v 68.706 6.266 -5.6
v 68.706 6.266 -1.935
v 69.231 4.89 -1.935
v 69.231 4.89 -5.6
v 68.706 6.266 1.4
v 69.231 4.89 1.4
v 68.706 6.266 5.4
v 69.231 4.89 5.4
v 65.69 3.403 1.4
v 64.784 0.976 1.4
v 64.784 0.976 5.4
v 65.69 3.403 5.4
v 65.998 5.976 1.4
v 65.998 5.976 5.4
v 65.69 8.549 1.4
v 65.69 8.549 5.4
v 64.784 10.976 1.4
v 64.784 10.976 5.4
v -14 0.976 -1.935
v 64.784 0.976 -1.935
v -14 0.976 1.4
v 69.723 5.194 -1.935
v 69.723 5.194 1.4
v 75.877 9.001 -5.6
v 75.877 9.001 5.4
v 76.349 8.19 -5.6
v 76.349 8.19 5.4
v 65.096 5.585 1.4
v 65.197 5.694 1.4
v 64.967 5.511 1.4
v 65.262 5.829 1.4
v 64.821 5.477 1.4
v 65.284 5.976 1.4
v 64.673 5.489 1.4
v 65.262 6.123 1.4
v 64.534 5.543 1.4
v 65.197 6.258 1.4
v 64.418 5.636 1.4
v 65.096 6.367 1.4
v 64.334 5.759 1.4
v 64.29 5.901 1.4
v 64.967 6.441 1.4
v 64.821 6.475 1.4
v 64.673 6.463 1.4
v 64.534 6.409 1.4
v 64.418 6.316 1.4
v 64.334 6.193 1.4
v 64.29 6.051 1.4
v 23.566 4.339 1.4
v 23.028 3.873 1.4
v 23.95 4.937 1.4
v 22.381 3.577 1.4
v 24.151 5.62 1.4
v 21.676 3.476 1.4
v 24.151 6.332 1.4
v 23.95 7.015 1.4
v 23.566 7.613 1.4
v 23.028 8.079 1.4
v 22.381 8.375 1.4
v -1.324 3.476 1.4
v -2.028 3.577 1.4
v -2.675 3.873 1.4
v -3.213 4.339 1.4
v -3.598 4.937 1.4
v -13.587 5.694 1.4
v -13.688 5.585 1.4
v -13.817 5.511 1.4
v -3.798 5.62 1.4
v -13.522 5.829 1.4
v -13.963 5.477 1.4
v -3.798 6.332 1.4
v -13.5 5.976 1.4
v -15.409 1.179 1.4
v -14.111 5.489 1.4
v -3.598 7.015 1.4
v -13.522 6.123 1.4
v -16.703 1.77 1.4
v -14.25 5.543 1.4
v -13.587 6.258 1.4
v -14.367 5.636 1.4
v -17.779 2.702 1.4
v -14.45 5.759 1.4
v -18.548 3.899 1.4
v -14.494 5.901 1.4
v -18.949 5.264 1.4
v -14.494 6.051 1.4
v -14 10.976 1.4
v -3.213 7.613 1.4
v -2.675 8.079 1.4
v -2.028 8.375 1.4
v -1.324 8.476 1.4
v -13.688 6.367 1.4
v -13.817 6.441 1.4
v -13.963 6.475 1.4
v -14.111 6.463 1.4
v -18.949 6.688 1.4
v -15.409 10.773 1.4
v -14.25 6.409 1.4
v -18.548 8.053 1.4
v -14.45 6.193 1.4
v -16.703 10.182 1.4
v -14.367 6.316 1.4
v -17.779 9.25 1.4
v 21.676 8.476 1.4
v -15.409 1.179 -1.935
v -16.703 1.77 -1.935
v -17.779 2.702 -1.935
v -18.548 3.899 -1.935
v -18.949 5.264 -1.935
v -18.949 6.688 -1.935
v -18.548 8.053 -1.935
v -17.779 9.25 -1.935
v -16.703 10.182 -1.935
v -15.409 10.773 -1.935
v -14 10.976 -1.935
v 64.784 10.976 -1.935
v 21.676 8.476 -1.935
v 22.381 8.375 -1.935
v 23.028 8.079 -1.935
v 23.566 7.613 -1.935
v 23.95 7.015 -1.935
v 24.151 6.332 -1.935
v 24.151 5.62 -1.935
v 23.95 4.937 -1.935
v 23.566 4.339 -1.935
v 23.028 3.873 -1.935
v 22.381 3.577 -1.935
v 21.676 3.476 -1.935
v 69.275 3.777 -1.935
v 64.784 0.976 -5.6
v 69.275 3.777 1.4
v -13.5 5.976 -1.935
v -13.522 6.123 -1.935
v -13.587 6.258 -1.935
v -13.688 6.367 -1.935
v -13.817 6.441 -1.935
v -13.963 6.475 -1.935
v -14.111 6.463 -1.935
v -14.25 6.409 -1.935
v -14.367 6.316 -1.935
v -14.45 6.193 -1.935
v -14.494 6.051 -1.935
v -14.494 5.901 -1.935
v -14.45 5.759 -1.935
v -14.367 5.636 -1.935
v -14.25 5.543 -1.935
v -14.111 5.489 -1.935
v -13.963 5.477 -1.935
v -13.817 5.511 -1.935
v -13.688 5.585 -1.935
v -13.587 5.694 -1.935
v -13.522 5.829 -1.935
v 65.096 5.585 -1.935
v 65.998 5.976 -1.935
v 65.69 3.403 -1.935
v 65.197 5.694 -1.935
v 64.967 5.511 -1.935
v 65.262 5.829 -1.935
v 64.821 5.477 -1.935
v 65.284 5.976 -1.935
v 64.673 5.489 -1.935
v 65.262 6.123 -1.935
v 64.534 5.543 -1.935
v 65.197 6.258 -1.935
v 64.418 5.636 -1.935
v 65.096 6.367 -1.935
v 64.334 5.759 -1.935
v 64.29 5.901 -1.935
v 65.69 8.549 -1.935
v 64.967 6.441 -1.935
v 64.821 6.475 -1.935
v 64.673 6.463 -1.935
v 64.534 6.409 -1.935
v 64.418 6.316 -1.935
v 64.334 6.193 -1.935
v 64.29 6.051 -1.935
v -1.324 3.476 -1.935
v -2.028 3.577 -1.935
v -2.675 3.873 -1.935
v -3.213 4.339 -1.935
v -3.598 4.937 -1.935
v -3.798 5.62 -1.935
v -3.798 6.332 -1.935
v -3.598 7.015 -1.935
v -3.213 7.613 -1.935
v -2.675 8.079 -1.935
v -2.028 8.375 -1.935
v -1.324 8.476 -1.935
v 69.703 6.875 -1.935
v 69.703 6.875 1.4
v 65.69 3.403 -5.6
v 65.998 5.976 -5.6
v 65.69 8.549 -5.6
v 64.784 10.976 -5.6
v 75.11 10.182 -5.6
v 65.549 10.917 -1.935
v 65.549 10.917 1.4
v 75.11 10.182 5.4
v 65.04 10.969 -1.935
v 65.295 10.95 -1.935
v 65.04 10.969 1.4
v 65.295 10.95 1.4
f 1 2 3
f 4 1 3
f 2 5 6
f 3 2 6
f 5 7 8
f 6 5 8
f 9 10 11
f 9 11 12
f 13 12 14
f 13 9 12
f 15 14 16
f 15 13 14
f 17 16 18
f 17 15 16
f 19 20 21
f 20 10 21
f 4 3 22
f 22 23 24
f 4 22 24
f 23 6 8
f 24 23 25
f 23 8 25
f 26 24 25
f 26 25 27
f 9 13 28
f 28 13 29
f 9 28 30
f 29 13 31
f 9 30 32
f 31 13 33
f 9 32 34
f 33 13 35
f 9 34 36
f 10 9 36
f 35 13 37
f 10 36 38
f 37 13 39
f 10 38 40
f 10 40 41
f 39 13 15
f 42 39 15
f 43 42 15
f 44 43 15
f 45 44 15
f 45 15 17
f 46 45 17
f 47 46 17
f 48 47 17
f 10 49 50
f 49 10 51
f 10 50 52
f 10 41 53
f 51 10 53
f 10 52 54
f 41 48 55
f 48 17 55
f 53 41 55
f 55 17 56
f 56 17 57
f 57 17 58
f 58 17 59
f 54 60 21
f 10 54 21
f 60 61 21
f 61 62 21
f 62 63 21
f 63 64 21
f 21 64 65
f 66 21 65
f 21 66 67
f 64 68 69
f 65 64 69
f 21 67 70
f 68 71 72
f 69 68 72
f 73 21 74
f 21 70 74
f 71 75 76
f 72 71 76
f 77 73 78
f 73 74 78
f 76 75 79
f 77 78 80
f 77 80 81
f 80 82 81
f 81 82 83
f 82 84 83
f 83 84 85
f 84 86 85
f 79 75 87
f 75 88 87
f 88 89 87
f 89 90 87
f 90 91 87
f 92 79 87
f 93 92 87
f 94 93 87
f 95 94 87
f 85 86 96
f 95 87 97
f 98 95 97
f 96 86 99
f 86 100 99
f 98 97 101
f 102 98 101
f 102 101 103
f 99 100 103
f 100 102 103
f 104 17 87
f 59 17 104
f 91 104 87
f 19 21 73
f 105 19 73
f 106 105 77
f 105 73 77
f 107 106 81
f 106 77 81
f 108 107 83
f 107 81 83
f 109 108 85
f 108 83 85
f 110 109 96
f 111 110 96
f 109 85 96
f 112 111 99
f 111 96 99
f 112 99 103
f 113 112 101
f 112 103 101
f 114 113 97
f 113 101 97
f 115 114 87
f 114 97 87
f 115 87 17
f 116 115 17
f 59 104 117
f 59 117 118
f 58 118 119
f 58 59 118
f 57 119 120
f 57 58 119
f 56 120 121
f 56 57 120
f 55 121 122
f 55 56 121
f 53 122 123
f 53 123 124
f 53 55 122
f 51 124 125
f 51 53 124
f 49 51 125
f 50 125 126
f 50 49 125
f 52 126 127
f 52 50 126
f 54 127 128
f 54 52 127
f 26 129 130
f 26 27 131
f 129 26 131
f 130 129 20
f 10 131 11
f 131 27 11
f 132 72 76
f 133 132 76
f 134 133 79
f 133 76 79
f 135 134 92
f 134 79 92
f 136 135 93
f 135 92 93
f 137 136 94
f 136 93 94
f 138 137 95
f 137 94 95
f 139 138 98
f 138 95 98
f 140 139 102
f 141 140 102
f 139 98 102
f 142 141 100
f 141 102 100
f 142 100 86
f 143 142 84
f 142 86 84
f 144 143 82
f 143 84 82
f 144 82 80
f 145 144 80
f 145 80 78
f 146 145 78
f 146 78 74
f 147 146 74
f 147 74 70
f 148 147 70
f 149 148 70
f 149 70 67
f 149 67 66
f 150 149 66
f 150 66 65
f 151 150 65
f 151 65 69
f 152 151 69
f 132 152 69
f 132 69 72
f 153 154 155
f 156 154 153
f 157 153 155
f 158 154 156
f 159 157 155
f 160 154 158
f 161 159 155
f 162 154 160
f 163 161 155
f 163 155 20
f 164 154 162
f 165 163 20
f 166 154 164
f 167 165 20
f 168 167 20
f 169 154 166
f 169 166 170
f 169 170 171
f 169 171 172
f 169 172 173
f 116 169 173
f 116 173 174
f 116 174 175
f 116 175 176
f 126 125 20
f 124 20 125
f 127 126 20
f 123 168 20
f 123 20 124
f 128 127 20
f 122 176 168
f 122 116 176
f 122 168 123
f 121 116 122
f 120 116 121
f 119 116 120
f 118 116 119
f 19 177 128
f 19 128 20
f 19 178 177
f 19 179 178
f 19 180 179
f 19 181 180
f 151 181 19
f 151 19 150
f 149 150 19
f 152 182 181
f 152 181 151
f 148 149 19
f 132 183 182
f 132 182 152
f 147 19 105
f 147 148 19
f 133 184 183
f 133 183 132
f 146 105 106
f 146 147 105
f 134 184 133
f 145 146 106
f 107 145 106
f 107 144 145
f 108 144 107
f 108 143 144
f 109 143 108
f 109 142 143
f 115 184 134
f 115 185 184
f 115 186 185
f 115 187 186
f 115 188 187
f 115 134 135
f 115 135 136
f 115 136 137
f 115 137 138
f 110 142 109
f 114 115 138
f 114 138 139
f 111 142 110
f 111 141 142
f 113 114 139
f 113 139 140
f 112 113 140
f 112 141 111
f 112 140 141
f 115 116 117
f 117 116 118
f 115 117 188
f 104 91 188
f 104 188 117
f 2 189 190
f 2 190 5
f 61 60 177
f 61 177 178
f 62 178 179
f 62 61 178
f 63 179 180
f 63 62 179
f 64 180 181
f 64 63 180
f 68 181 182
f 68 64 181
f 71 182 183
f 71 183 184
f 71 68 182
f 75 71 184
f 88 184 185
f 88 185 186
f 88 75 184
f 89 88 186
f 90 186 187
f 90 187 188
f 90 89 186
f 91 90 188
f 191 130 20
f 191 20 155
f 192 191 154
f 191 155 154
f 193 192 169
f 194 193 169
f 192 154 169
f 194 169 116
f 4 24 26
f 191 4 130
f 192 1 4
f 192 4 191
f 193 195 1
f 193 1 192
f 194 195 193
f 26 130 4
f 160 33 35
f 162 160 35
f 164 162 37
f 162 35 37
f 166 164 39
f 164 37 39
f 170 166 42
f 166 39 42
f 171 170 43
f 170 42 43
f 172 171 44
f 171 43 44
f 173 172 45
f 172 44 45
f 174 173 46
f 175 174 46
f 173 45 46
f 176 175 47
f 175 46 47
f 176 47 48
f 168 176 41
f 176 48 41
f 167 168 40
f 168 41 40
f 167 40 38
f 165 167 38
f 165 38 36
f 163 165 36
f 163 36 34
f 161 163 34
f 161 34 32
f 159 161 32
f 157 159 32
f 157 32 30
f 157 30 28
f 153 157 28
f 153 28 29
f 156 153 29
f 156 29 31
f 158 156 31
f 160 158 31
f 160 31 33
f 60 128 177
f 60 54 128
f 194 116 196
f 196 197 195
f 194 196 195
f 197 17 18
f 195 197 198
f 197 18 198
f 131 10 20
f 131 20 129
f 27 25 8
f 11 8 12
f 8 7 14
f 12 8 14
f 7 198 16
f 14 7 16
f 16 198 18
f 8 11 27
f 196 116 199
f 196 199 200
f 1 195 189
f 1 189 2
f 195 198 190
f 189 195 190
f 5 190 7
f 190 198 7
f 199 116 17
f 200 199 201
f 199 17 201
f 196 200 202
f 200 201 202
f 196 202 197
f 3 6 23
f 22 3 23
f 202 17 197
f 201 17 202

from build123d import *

# Parameters (mm, degrees)
EXTRUDE_1_DEPTH      = 1.4
EXTRUDE_1_DEPTH_BACK = 1.935048816
MM_1_D               = 1
MM_1_DEPTH           = 3.69956969
MM_1_TIP             = 0.30043031
MM_2_D               = 1
MM_2_DEPTH           = 3.69956969
MM_2_TIP             = 0.30043031
EXTRUDE_4_DEPTH      = 4
EXTRUDE_4_DEPTH_BACK = 7
CUT_EXTRUDE_4_DEPTH  = 4


with BuildPart() as part:
    # 草图1 → 凸台-拉伸1 (new body, two sides)
    with BuildSketch(Plane.XY) as extrude_1_sk:
        with BuildLine():
            Line((-14, 10.976009084), (64.784112274, 10.976009084))
            ThreePointArc((64.784112274, 10.976009084), (69.784112274, 5.976009084), (64.784112274, 0.976009084))
            Line((64.784112274, 0.976009084), (-14, 0.976009084))
            ThreePointArc((-14, 0.976009084), (-19, 5.976009084), (-14, 10.976009084))
        make_face()
        with BuildLine():
            Line((21.676320512, 3.476009084), (-1.323679488, 3.476009084))
            ThreePointArc((-1.323679488, 3.476009084), (-3.823679488, 5.976009084), (-1.323679488, 8.476009084))
            Line((-1.323679488, 8.476009084), (21.676320512, 8.476009084))
            ThreePointArc((21.676320512, 8.476009084), (24.176320512, 5.976009084), (21.676320512, 3.476009084))
        make_face(mode=Mode.SUBTRACT)
    extrude(amount=EXTRUDE_1_DEPTH)
    extrude(extrude_1_sk.sketch, amount=-EXTRUDE_1_DEPTH_BACK)

    # 大小mm 暗销孔1
    with Locations(Plane(origin=(0, 0, -1.935048816), x_dir=(-1, 0, 0), z_dir=(0, 0, -1))):
        with Locations((14, 5.976009084)):
            Hole(MM_1_D / 2, depth=MM_1_DEPTH)
            with Locations((0, 0, -(MM_1_DEPTH + MM_1_TIP / 2))):  # 118° drill point
                Cone(0, MM_1_D / 2, MM_1_TIP, mode=Mode.SUBTRACT)

    # 大小mm 暗销孔2
    with Locations(Plane(origin=(0, 0, -1.935048816), x_dir=(-1, 0, 0), z_dir=(0, 0, -1))):
        with Locations((-64.784112274, 5.976009084)):
            Hole(MM_2_D / 2, depth=MM_2_DEPTH)
            with Locations((0, 0, -(MM_2_DEPTH + MM_2_TIP / 2))):  # 118° drill point
                Cone(0, MM_2_D / 2, MM_2_TIP, mode=Mode.SUBTRACT)

    # 草图11 → 凸台-拉伸4 (add, two sides)
    with BuildSketch(Plane.XY.offset(1.4)) as extrude_4_sk:
        with BuildLine():
            Line((64.784112274, 10.976009084), (75.11027427, 10.181945777))
            Line((75.11027427, 10.181945777), (68.706480161, 6.265649051))
            Line((68.706480161, 6.265649051), (69.231074418, 4.88985116))
            Line((69.231074418, 4.88985116), (75.876804715, 9.001268784))
            Line((75.876804715, 9.001268784), (76.348764637, 8.189866665))
            Line((76.348764637, 8.189866665), (64.784112274, 0.976009084))
            ThreePointArc((64.784112274, 0.976009084), (65.998123298, 5.976009084), (64.784112274, 10.976009084))
        make_face()
    extrude(amount=EXTRUDE_4_DEPTH)
    extrude(extrude_4_sk.sketch, amount=-EXTRUDE_4_DEPTH_BACK)

    # 草图12 → 切除-拉伸4 (cut)
    with BuildSketch(Plane.XY.offset(1.4)):
        Polygon((69.702654004, 6.874867944), (68.706480161, 6.265649051), (69.231074418, 4.88985116), (69.722566431, 5.193915399), (71.19681176, 6.105965386), align=None)
        Polygon((64.784112274, 0.976009084), (69.274656978, 3.777143865), (71.000307029, 3.200660754), (64.195477274, -1.252602435), align=None)
    extrude(amount=-CUT_EXTRUDE_4_DEPTH, mode=Mode.SUBTRACT)


solid = part.part
